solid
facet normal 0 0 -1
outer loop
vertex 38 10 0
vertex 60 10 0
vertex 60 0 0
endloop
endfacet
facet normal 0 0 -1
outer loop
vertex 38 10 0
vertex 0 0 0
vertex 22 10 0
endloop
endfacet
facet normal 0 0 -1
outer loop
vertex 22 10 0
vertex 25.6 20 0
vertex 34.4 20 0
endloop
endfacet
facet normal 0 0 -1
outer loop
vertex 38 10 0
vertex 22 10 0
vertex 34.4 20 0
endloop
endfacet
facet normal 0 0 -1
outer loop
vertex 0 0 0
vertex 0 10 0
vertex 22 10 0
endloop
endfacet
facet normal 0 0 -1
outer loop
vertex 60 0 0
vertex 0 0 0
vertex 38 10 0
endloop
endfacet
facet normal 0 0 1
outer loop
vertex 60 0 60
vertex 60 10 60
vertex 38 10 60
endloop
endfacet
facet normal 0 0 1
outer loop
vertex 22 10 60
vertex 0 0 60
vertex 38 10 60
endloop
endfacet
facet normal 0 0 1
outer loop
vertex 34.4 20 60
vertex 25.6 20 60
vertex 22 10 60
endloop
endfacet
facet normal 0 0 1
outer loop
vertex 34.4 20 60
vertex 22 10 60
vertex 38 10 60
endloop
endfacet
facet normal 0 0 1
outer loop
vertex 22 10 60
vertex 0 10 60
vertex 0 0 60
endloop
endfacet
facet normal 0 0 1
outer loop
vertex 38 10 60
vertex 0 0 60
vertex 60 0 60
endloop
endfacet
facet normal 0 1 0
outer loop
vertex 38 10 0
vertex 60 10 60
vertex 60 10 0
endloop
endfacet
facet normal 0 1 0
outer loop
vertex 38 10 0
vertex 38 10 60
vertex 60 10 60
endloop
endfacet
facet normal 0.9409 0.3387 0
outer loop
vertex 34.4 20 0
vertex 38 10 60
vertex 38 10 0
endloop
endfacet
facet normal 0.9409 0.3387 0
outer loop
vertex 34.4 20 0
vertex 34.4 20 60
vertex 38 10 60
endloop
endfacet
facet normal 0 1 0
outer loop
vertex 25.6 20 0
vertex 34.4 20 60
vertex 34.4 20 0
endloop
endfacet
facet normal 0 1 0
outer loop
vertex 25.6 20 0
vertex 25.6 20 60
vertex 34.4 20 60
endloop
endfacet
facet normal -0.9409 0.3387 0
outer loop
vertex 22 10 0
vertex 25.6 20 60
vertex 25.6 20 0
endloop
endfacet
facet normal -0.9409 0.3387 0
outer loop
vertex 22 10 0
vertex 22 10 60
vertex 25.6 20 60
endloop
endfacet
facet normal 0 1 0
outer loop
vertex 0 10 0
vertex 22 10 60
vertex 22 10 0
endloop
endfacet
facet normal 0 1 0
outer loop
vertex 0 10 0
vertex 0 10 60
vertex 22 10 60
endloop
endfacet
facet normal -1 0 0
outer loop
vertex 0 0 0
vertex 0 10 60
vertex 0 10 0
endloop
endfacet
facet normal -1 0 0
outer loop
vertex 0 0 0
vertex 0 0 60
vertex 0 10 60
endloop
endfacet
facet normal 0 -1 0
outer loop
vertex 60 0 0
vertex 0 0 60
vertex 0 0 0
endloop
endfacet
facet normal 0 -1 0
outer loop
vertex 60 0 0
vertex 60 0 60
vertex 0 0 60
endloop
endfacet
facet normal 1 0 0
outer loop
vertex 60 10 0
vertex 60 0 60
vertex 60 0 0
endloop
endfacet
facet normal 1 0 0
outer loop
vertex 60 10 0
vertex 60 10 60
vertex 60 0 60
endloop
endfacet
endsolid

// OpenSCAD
$fn = 32;

// ----------------------------------------------------------------------
// V guide rail: dovetail, 60 mm wide
// ----------------------------------------------------------------------

// --- parameters (mm) ---
rail_w = 60;              // rail width, X
base_t = 10;              // base plate thickness
v_depth = 10;             // V feature depth / height
v_half_w = 8;             // half width of the V at the base face
plate_t = 60;             // rail length, Z (the extrusion height)
top_half_w = 4.4;         // half width at the dovetail top

dovetail_base = 2 * v_half_w;  // dovetail width at the base
dovetail_top = 2 * top_half_w;  // dovetail width at the top

profile = [[0, 0], [60, 0], [60, 10], [38, 10], [34.4, 20], [25.6, 20], [22, 10], [0, 10]];  // primary outline, 8 points, counter clockwise

// --- the one profile operation ---
linear_extrude(height = plate_t) polygon(points = profile);
